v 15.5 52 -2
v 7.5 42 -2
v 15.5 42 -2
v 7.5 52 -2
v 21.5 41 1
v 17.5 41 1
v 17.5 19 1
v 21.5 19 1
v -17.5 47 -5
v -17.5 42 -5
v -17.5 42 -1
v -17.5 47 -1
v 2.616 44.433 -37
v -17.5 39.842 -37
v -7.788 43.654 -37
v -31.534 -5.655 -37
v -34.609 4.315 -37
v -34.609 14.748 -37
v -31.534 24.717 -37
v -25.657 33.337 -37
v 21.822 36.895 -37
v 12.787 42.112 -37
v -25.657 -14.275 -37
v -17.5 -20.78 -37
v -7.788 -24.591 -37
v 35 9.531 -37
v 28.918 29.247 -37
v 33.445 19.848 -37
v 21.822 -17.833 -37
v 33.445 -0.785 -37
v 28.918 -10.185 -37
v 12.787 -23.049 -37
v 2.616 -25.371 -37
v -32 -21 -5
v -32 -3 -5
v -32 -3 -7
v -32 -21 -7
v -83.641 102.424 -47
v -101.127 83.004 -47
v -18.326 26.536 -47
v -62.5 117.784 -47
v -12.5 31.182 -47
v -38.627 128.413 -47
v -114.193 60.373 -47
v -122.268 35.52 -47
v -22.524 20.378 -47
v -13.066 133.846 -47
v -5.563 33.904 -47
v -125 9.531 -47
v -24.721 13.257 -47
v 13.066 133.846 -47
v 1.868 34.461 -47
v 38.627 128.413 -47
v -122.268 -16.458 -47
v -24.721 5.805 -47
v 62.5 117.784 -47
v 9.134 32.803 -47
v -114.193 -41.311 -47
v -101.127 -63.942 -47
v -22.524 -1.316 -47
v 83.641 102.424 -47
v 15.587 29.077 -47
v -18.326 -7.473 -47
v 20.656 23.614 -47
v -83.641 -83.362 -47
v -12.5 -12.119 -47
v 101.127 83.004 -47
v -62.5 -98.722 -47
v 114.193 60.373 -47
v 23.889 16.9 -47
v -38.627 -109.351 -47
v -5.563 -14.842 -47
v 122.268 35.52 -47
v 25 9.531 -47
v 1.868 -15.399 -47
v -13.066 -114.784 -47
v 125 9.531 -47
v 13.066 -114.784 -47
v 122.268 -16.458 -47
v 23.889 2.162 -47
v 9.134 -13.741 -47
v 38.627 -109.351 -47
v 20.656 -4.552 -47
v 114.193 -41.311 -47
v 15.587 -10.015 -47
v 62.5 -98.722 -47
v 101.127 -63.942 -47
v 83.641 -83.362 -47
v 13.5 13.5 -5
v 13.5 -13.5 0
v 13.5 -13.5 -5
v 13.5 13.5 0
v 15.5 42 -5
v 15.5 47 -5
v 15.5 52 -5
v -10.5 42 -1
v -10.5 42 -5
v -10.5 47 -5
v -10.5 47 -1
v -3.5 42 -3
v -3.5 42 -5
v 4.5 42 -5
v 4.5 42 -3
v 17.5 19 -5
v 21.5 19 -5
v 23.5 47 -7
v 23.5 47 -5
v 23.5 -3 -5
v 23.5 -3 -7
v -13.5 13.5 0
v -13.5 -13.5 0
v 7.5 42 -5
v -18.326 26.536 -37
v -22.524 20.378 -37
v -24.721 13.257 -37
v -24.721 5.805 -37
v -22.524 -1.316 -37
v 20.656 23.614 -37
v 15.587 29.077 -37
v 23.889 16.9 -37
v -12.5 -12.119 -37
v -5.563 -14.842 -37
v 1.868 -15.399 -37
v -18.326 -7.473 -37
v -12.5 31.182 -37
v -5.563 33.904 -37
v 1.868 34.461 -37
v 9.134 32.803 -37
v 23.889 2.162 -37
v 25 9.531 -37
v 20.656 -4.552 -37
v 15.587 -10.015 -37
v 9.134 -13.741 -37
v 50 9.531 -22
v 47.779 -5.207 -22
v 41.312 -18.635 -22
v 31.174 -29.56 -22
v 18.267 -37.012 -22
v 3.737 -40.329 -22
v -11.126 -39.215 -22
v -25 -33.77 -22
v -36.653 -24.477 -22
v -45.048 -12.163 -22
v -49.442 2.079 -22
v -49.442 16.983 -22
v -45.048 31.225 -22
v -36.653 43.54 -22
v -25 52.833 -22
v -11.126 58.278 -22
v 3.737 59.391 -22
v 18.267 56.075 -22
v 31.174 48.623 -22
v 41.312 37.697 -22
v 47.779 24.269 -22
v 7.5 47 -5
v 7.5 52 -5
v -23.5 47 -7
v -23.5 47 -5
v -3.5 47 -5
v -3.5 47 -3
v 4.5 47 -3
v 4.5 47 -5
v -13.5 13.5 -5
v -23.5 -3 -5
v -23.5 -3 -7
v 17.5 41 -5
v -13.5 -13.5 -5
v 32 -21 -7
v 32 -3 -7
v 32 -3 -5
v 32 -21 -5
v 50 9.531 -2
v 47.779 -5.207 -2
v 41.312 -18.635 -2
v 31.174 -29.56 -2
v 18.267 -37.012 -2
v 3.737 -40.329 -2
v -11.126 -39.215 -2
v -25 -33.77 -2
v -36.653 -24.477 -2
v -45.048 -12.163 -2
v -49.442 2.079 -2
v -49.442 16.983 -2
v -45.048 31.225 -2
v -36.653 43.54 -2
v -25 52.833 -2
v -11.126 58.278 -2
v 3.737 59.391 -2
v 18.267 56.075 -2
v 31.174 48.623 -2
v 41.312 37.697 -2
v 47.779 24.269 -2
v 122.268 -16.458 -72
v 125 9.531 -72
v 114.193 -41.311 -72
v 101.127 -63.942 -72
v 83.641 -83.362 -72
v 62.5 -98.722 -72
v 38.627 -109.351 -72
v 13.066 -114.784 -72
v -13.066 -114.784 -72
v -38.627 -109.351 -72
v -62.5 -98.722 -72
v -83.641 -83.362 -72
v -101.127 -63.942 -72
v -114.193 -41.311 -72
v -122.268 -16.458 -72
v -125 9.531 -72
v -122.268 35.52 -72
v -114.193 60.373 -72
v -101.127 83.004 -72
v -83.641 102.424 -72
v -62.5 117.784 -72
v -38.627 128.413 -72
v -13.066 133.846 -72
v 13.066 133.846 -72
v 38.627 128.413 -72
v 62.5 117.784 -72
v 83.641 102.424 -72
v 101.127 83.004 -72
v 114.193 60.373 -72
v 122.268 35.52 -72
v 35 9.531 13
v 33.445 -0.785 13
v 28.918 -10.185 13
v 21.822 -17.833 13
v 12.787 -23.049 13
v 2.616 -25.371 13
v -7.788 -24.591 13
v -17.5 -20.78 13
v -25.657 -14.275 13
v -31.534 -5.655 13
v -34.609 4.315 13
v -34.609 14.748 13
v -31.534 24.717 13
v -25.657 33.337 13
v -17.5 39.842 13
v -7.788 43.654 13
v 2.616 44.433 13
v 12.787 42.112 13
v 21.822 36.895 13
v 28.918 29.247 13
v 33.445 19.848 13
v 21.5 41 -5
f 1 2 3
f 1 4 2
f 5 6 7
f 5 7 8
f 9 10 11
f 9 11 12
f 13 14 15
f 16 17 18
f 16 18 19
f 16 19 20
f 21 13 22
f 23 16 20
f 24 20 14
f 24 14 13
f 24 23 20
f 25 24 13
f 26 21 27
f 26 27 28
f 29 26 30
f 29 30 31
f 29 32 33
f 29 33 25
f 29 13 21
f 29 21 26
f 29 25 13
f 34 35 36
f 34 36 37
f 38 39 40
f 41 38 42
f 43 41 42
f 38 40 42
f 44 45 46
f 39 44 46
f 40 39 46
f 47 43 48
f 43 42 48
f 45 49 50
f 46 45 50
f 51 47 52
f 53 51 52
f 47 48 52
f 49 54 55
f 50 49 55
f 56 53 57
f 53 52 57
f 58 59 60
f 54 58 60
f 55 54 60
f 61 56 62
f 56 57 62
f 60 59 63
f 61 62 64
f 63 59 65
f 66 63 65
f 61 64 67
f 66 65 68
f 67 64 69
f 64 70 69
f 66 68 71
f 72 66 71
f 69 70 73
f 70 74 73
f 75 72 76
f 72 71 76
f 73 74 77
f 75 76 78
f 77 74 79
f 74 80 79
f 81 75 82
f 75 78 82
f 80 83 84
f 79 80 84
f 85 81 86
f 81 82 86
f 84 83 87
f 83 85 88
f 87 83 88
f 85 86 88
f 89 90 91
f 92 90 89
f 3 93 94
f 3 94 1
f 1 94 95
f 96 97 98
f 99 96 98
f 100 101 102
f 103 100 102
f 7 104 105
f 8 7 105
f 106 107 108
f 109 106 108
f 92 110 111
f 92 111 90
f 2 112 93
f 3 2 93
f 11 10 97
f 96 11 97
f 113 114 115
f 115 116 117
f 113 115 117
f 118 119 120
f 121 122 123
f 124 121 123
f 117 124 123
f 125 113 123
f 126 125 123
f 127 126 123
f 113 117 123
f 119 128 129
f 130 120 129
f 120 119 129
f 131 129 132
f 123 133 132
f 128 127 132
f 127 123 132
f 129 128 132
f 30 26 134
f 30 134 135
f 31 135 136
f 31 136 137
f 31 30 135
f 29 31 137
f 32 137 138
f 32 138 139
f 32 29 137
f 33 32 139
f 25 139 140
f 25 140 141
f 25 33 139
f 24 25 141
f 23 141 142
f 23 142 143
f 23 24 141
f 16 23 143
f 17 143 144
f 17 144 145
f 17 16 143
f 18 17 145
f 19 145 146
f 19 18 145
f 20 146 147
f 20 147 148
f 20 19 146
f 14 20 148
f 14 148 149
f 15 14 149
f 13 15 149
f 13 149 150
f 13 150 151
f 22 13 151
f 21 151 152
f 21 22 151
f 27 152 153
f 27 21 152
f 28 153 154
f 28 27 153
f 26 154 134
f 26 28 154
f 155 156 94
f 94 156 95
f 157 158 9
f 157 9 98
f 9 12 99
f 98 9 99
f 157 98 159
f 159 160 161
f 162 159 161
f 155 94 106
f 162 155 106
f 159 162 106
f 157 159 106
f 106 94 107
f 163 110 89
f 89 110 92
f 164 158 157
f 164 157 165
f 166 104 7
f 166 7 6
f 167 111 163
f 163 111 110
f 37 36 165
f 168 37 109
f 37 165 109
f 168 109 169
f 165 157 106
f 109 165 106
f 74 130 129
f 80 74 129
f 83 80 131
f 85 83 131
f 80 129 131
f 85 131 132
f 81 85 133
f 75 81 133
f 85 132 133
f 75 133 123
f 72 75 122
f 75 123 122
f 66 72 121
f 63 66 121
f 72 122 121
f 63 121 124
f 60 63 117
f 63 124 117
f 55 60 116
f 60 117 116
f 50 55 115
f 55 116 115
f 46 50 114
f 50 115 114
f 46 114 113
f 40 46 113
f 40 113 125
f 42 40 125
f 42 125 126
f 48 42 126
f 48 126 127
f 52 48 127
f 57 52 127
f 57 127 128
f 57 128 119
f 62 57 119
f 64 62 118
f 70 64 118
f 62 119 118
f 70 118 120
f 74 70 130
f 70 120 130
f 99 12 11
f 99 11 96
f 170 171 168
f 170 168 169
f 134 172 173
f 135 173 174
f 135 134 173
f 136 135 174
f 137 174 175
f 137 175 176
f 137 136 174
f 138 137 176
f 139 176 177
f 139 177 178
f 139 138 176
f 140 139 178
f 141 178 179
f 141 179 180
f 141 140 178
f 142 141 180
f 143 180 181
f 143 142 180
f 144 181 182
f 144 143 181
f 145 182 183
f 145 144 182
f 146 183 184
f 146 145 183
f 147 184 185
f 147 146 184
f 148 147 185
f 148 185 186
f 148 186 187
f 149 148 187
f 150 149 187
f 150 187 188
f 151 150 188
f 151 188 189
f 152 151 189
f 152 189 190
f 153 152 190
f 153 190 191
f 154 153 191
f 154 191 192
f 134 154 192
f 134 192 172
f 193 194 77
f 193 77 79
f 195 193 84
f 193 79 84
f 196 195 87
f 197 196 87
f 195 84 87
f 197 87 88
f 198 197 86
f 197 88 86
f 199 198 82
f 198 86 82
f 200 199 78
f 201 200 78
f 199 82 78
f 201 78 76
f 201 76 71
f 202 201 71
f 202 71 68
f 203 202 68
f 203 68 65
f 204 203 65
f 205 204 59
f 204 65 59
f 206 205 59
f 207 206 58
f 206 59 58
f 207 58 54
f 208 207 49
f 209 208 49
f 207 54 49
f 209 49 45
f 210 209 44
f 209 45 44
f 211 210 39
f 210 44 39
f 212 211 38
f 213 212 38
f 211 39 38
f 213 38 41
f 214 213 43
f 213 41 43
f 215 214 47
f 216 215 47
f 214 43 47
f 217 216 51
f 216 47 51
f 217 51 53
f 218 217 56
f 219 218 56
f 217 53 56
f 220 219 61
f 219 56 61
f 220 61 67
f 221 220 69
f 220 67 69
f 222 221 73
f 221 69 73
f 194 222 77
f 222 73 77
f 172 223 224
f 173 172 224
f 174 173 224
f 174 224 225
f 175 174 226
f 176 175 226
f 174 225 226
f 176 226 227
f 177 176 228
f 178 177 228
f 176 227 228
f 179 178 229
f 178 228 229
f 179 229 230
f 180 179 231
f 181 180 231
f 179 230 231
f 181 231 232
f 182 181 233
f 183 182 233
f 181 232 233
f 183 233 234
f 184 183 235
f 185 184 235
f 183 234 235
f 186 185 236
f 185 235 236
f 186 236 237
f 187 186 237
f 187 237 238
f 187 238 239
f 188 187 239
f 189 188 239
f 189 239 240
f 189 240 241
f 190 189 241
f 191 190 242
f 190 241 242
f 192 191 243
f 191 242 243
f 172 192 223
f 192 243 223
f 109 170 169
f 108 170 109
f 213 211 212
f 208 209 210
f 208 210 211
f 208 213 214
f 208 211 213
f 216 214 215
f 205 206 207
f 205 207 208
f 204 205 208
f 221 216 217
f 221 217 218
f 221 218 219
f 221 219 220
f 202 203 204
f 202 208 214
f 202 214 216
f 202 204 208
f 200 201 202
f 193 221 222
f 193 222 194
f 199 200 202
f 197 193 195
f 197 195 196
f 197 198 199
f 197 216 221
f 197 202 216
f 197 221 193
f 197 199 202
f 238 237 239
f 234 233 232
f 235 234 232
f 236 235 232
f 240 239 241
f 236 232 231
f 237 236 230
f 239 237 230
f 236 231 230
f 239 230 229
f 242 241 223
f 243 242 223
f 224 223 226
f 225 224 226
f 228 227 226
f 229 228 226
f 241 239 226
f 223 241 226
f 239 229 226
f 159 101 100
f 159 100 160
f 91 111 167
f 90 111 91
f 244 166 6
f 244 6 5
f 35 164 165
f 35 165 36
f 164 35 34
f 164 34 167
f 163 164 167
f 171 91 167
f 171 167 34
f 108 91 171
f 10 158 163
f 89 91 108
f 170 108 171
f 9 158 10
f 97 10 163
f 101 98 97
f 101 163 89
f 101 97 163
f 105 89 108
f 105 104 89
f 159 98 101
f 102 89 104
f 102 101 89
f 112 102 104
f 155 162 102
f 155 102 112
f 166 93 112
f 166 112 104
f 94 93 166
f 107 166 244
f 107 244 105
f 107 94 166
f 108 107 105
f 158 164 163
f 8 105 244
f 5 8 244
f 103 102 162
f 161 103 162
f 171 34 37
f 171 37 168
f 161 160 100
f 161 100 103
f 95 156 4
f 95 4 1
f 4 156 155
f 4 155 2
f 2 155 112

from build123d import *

# Parameters (mm, degrees)
F0_W           = 27
F0_H           = 27
F1_DEPTH       = 2
F3_W           = 47
F3_H           = 50
F4_DEPTH       = 2
F6_DEPTH       = 2
F7_DEPTH       = 3
F8_W           = 8
F8_H           = 5
F9_DEPTH       = 2
F10_W          = 8
F10_H          = 5
F11_DEPTH      = 3
F12_W          = 4
F12_H          = 22
F13_DEPTH      = 6
F14_W          = 7
F14_H          = 5
F15_DEPTH      = 4
F16_R          = 50
F16_R_2        = 47.5
F17_DEPTH      = 30
F17_DEPTH_BACK = 20
F18_SIZE       = 15
F19_R          = 25
F20_DEPTH      = 10
F21_R          = 125
F21_R_2        = 25
F22_DEPTH      = 25


with BuildPart() as f1:
    # F0 (on Top) → F1 (new body)
    with BuildSketch(Plane.XY):
        Rectangle(F0_W, F0_H)
    extrude(amount=-F1_DEPTH)


with BuildPart() as f4:
    # F3 (on offset) → F4 (new body)
    with BuildSketch(Plane(origin=(0, 0, -5), x_dir=(1, 0, 0), z_dir=(0, 0, -1))):
        with Locations((0, -22)):
            Rectangle(F3_W, F3_H)
    extrude(amount=F4_DEPTH)

    # F5 (on face) → F6 (join)
    with BuildSketch(Plane.XY.offset(-5)):
        Polygon((32, -21), (32, -3), (23.5, -3), (-23.5, -3), (-32, -3), (-32, -21), align=None)
    extrude(amount=-F6_DEPTH)

    # F8 (on face) → F9 (join)
    with BuildSketch(Plane.XY.offset(-5)):
        with Locations((0.5, 44.5)):
            Rectangle(F8_W, F8_H)
    extrude(amount=F9_DEPTH)

    # F10 (on face) → F11 (join)
    with BuildSketch(Plane.XY.offset(-5)):
        with Locations((11.5, 44.5)):
            Rectangle(F10_W, F10_H)
        with Locations((11.5, 49.5)):
            Rectangle(F10_W, F10_H)
    extrude(amount=F11_DEPTH)

    # F12 (on face) → F13 (join)
    with BuildSketch(Plane.XY.offset(-5)):
        with Locations((19.5, 30)):
            Rectangle(F12_W, F12_H)
    extrude(amount=F13_DEPTH)


with BuildPart() as f7:
    # F7 (new, through all): a face of the model
    f7_faces = [f1.part.faces().sort_by_distance(p)[0] for p in [
        (0, 0, -2),
    ]]
    extrude(f7_faces, amount=F7_DEPTH)


with BuildPart() as f1_1:
    add(f1.part)

    add(f4.part)  # F15 merges F4

    add(f7.part)  # F15 merges F7
    # F14 (on face) → F15 (join)
    with BuildSketch(Plane.XY.offset(-5)):
        with Locations((-14, 44.5)):
            Rectangle(F14_W, F14_H)
    extrude(amount=F15_DEPTH)


with BuildPart() as f17:
    # F16 (on face) → F17 (new body, two sides)
    with BuildSketch(Plane(origin=(0, 0, -7), x_dir=(1, 0, 0), z_dir=(0, 0, -1))) as f17_sk:
        with Locations((0, -9.53125)):
            Circle(F16_R)
        with Locations((0, -9.53125)):
            Circle(F16_R_2, mode=Mode.SUBTRACT)
        with Locations((0, -9.53125)):
            Circle(F16_R_2)
        Polygon((32, 21), (32, 3), (23.5, 3), (23.5, -47), (-23.5, -47), (-23.5, 3), (-32, 3), (-32, 21), align=None, mode=Mode.SUBTRACT)
        Polygon((23.5, 3), (32, 3), (32, 21), (-32, 21), (-32, 3), (-23.5, 3), (-23.5, -47), (23.5, -47), align=None)
    extrude(amount=F17_DEPTH)
    extrude(f17_sk.sketch, amount=-F17_DEPTH_BACK)

    # F18
    f18_edges = [f17.edges().sort_by_distance(p)[0] for p in [
        (-50, 9.53125, 13),
        (-50, 9.53125, -37),
    ]]
    chamfer(f18_edges, length=F18_SIZE)


with BuildPart() as f20:
    # F19 (on face) → F20 (new body)
    with BuildSketch(Plane(origin=(0, 0, -37), x_dir=(1, 0, 0), z_dir=(0, 0, -1))):
        with Locations((0, -9.53125)):
            Circle(F19_R)
    extrude(amount=F20_DEPTH)

    # F21 (on face) → F22 (join)
    with BuildSketch(Plane(origin=(0, 0, -47), x_dir=(1, 0, 0), z_dir=(0, 0, -1))):
        with Locations((0, -9.53125)):
            Circle(F21_R)
        with Locations((0, -9.53125)):
            Circle(F21_R_2, mode=Mode.SUBTRACT)
        with Locations((0, -9.53125)):
            Circle(F21_R_2)
    extrude(amount=F22_DEPTH)


solid = Compound([f1_1.part, f17.part, f20.part])
